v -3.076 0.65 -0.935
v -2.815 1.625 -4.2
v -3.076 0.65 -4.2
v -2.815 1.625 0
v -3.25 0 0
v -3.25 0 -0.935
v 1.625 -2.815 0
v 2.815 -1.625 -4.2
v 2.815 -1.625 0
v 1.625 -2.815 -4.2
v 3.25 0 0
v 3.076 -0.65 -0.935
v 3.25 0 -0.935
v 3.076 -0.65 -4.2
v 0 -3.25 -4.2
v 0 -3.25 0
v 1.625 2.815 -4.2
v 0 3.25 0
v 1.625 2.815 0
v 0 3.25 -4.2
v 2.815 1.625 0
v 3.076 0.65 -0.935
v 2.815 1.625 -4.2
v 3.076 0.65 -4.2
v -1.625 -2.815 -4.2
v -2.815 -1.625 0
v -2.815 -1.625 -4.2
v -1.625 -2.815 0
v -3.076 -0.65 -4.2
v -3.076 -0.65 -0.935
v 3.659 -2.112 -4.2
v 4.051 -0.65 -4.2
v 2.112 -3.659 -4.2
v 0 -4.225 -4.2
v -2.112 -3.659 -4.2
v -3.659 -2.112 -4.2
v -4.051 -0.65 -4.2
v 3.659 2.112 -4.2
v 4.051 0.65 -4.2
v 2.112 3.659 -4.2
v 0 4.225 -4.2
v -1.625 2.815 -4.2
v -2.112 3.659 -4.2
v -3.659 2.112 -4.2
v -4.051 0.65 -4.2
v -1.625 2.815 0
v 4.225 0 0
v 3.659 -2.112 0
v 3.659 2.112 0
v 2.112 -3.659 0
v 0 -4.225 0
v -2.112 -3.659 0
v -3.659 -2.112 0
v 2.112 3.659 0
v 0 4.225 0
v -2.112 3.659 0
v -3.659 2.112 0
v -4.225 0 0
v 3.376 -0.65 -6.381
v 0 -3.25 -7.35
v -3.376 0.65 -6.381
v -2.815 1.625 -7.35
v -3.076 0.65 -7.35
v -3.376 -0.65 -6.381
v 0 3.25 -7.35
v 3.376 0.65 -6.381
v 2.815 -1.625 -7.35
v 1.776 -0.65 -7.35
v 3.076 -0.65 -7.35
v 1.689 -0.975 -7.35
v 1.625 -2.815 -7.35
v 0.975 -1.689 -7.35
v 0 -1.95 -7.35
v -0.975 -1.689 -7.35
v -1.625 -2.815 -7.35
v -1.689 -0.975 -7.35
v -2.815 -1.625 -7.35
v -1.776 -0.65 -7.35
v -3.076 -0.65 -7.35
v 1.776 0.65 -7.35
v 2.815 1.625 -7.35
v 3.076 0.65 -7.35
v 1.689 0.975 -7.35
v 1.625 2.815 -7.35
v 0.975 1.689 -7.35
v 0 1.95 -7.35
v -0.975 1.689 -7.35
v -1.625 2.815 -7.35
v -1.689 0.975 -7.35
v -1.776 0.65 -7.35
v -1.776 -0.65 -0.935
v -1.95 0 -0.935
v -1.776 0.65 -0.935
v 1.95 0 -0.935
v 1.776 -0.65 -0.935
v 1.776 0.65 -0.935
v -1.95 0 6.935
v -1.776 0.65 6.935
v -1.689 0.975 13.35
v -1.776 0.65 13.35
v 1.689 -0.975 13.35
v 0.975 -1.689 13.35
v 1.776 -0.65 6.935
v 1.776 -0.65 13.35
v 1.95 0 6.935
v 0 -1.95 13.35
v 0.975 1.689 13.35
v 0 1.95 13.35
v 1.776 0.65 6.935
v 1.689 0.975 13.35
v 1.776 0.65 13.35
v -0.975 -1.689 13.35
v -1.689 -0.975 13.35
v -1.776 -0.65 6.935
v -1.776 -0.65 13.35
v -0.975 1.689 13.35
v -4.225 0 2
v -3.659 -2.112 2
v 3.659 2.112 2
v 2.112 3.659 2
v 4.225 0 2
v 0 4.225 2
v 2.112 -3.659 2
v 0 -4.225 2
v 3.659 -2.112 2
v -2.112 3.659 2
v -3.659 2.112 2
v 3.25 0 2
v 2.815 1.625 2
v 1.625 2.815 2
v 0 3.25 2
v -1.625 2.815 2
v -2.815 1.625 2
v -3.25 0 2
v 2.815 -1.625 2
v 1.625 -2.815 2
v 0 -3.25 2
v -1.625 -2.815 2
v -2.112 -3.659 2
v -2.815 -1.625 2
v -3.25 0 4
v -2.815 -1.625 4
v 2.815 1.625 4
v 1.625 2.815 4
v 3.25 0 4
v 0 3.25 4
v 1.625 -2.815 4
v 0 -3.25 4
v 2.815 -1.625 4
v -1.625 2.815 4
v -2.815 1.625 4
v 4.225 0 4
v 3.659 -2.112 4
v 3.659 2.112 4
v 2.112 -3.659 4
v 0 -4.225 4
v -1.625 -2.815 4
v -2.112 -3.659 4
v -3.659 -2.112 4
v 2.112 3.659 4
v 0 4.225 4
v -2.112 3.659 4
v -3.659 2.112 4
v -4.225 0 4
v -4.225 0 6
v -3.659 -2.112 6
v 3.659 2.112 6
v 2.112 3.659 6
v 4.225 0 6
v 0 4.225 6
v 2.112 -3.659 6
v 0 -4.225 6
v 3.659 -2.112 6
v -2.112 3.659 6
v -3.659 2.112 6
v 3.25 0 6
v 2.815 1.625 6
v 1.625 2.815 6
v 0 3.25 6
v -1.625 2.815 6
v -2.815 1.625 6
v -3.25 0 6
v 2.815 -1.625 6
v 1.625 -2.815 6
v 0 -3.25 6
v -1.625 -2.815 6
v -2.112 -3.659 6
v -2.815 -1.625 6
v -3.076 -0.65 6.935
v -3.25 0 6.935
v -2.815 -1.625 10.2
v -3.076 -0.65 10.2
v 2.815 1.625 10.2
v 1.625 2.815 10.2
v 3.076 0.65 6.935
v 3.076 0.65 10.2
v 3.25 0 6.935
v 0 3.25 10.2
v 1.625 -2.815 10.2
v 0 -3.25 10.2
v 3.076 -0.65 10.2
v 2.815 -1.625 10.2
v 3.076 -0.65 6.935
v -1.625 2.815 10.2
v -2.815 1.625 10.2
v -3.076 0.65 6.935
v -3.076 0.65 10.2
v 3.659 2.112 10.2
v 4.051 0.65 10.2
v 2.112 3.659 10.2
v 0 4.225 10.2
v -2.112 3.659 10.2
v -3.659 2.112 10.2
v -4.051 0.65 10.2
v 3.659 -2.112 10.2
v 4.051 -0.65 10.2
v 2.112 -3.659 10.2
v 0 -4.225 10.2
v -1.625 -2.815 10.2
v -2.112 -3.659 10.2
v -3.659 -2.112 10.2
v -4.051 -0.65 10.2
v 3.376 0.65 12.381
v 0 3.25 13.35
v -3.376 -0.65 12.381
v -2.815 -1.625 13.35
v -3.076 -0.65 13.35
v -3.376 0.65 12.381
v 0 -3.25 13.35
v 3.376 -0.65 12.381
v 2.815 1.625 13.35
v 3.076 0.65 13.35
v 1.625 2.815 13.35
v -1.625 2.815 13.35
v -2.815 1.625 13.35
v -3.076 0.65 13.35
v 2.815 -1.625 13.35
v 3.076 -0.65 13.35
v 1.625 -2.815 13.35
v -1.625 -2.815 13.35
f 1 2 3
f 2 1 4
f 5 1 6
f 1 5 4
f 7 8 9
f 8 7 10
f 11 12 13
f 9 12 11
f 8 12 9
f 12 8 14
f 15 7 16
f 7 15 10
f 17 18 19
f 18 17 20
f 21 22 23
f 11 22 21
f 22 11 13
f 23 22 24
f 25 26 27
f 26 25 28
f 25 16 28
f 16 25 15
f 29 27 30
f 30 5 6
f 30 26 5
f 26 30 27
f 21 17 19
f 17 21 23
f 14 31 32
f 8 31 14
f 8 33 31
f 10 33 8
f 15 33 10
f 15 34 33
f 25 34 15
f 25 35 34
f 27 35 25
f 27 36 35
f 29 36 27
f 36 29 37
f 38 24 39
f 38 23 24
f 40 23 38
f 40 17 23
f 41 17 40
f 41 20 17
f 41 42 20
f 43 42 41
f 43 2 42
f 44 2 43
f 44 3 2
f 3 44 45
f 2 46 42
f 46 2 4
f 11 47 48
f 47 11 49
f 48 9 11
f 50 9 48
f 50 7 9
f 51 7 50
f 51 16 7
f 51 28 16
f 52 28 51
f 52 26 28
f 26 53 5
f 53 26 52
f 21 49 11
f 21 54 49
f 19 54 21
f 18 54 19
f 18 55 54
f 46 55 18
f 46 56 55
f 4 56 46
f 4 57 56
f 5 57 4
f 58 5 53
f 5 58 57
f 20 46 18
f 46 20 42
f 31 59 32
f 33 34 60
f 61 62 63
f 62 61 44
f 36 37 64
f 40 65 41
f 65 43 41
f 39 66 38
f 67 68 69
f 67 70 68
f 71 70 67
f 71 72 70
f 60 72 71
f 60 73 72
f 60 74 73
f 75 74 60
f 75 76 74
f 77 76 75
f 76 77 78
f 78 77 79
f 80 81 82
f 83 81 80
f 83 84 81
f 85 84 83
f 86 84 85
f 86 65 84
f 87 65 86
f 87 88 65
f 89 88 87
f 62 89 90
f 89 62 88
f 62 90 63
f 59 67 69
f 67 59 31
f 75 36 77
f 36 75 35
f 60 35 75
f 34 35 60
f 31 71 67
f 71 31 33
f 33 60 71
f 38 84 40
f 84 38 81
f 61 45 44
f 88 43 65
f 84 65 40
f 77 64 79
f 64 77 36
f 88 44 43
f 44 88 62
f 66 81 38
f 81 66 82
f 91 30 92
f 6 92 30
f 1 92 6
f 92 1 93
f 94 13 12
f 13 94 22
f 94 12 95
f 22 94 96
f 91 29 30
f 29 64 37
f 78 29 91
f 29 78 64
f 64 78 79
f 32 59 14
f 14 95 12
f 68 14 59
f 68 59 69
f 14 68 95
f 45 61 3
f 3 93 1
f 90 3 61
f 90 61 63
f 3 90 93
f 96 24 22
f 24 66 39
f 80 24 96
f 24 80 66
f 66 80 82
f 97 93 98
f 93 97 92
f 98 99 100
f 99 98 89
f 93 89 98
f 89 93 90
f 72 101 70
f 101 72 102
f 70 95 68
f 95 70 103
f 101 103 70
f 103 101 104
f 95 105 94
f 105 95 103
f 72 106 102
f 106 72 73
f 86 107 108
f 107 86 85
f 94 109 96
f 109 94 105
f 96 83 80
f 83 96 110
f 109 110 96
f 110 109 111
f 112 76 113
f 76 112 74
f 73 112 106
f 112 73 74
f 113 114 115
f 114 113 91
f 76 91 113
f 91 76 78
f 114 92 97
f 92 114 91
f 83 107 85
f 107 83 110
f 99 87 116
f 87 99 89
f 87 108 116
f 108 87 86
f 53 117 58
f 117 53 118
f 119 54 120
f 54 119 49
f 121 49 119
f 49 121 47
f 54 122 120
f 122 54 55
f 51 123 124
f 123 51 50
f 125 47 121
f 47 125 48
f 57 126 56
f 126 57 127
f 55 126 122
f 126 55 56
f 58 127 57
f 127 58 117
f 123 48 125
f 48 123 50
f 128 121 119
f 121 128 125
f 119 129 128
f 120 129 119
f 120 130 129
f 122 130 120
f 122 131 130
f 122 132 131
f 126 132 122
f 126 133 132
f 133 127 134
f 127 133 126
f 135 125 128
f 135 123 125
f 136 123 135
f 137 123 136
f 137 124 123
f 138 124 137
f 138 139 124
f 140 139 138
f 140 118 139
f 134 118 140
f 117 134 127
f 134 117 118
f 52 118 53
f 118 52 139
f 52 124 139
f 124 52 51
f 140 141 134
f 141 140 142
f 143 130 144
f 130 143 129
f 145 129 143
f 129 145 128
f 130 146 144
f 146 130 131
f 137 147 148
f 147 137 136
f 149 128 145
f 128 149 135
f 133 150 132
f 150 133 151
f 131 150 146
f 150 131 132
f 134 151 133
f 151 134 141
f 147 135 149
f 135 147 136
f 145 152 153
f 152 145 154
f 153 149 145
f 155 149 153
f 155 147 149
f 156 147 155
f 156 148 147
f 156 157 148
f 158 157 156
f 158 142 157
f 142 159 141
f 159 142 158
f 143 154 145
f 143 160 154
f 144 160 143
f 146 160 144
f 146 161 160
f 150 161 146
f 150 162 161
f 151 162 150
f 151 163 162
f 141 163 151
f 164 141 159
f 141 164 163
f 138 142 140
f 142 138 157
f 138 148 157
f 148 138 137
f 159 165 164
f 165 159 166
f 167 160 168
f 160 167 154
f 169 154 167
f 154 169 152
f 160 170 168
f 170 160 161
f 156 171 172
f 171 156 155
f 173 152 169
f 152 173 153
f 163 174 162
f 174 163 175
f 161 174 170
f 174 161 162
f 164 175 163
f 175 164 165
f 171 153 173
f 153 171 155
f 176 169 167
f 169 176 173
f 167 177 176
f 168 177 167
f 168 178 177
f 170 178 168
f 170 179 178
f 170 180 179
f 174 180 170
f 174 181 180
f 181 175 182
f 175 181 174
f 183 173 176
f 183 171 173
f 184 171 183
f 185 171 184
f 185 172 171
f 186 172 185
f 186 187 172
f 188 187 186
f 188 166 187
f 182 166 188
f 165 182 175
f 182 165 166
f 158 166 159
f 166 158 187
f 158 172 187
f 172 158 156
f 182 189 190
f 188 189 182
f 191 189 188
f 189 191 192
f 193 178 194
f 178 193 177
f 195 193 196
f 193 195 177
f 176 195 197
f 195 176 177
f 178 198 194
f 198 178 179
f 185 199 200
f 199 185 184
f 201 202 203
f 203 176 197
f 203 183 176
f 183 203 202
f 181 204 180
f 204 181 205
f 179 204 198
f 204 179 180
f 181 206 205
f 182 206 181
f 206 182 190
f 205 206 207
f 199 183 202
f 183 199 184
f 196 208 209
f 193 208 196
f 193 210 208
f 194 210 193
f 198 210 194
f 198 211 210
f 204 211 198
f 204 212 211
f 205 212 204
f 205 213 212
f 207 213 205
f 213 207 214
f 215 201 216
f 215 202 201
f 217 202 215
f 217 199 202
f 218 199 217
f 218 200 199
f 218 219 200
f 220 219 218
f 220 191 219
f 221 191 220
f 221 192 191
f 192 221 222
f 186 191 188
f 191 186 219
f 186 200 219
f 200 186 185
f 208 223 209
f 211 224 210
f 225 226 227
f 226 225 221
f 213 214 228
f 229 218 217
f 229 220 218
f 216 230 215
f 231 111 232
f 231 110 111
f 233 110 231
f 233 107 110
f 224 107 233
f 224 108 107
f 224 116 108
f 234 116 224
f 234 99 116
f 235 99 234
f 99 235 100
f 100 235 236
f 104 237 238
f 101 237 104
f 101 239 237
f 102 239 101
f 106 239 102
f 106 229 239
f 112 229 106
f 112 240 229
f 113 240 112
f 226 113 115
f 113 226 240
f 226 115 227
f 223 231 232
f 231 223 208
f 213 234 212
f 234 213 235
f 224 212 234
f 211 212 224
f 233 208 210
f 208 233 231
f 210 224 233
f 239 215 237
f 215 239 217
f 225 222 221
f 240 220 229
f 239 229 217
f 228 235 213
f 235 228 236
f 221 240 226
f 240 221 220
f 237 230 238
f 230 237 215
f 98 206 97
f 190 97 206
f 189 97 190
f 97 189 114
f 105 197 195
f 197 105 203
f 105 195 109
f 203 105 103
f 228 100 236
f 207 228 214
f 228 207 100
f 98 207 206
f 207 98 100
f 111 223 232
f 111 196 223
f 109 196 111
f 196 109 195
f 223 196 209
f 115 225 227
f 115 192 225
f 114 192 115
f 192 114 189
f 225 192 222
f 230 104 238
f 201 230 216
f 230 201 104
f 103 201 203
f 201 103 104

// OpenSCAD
// Some samples
// Yazzo large hole - 9/32in hole size
//spearbaseconnector(4.2, 7.22/2.0, 8.0);

// connector for Klikko hole- 9/32in hole size
//translate([15,0,0])
spearspearconnector(4.2, 6.5/2.0, 6, 4.2, 6.5/2.0);


// circuit board hole - 3.22mm diameter, 1/8th inch (3.27mm)
//translate([-10,0,0])
//spearbaseconnector(4.2, 3.22/2.0, 8.0);

// connector for Klikko - PCB
//translate([30,0,0])
//spearspearconnector(4.2, 7.22/2.0, 8.0, 1.65, 3.22/2.0);

// connector for Klikko hole- 9/32in hole size
//translate([40,0,0])
//spearspearconnector(1.65, 3.22/2.0, 8.0, 1.65, 3.22/2.0);


module spearbaseconnector(holelength, holeradius, gap)
{		
	union()
	{
		spacer(gap, holeradius);

		// Spear top cap
		translate([0,0,gap])
			spearcap(holelength, holeradius, holelength*0.75);
	}
}

module spearcap(holelength, holeradius, capheight)
{
	capradius=holeradius*1.3;

	totalheight = capheight+holelength;
	slotheight = totalheight*0.9;
	slotwidth = capradius*2+0.25;
	slotthickness = holeradius * 0.40;
	shrinkfactor = 0.6;

	difference()
	{
		union()
		{
			// Basic cylinder to fit in the hole
			cylinder(h=holelength, r=holeradius, $fn=12);
		
			translate([0,0,holelength])
				cylinder(h=capheight, r1=capradius, r2=holeradius, $fn=12);
		}

		// Subtract out the slot material
		translate([-slotwidth/2, -slotthickness/2.0,totalheight-slotheight+0.2])
			cube(size=[slotwidth, slotthickness, slotheight], center=false);

//		rotate([0,0,90]) translate([-slotwidth/2, -slotthickness/2.0,totalheight-slotheight+0.2])
//			cube(size=[slotwidth, slotthickness, slotheight], center=false);

		translate([0,0,-0.25])
		cylinder(r=holeradius*shrinkfactor, h = totalheight+0.5, $fn =12);

	}
}

// A spacer is simply a cylinder with two 'caps', which are also cylinders, but larger in size
// the caps are there to prevent the piece that is connected from sliding along the shaft.
module spacer(length,radius)
{
	capheight=2;
	capradius = radius * 1.3;
	gap = length-(capheight*2);
	shrinkfactor = 0.6;

	difference()
	{
		union()
		{
			// Base flange
			cylinder(h=capheight, r=capradius, $fn = 12);
	
			// length of spacer gap
			translate([0,0,capheight])
				cylinder(h=gap, r=radius, $fn=12);
	
			// top flange
			translate([0,0,capheight+gap])
				cylinder(h=capheight, r=capradius, $fn = 12);
		}

		translate([0,0,-0.25]) 
			cylinder(h=length+0.5, r=radius*shrinkfactor, $fn=12);
	}
}

module spearspearconnector(holelength1, holeradius1, gap, holelength2, holeradius2)
{
	shrinkfactor = 0.6;

	union()
	{
		// Spear bottom cap
		rotate([180,0,0])
			spearcap(holelength1, holeradius1, holelength1*0.75);

		spacer(gap, holeradius1);

		// Spear top cap
		translate([0,0,gap])
			spearcap(holelength2, holeradius2, holelength2*0.75);
	}
}
